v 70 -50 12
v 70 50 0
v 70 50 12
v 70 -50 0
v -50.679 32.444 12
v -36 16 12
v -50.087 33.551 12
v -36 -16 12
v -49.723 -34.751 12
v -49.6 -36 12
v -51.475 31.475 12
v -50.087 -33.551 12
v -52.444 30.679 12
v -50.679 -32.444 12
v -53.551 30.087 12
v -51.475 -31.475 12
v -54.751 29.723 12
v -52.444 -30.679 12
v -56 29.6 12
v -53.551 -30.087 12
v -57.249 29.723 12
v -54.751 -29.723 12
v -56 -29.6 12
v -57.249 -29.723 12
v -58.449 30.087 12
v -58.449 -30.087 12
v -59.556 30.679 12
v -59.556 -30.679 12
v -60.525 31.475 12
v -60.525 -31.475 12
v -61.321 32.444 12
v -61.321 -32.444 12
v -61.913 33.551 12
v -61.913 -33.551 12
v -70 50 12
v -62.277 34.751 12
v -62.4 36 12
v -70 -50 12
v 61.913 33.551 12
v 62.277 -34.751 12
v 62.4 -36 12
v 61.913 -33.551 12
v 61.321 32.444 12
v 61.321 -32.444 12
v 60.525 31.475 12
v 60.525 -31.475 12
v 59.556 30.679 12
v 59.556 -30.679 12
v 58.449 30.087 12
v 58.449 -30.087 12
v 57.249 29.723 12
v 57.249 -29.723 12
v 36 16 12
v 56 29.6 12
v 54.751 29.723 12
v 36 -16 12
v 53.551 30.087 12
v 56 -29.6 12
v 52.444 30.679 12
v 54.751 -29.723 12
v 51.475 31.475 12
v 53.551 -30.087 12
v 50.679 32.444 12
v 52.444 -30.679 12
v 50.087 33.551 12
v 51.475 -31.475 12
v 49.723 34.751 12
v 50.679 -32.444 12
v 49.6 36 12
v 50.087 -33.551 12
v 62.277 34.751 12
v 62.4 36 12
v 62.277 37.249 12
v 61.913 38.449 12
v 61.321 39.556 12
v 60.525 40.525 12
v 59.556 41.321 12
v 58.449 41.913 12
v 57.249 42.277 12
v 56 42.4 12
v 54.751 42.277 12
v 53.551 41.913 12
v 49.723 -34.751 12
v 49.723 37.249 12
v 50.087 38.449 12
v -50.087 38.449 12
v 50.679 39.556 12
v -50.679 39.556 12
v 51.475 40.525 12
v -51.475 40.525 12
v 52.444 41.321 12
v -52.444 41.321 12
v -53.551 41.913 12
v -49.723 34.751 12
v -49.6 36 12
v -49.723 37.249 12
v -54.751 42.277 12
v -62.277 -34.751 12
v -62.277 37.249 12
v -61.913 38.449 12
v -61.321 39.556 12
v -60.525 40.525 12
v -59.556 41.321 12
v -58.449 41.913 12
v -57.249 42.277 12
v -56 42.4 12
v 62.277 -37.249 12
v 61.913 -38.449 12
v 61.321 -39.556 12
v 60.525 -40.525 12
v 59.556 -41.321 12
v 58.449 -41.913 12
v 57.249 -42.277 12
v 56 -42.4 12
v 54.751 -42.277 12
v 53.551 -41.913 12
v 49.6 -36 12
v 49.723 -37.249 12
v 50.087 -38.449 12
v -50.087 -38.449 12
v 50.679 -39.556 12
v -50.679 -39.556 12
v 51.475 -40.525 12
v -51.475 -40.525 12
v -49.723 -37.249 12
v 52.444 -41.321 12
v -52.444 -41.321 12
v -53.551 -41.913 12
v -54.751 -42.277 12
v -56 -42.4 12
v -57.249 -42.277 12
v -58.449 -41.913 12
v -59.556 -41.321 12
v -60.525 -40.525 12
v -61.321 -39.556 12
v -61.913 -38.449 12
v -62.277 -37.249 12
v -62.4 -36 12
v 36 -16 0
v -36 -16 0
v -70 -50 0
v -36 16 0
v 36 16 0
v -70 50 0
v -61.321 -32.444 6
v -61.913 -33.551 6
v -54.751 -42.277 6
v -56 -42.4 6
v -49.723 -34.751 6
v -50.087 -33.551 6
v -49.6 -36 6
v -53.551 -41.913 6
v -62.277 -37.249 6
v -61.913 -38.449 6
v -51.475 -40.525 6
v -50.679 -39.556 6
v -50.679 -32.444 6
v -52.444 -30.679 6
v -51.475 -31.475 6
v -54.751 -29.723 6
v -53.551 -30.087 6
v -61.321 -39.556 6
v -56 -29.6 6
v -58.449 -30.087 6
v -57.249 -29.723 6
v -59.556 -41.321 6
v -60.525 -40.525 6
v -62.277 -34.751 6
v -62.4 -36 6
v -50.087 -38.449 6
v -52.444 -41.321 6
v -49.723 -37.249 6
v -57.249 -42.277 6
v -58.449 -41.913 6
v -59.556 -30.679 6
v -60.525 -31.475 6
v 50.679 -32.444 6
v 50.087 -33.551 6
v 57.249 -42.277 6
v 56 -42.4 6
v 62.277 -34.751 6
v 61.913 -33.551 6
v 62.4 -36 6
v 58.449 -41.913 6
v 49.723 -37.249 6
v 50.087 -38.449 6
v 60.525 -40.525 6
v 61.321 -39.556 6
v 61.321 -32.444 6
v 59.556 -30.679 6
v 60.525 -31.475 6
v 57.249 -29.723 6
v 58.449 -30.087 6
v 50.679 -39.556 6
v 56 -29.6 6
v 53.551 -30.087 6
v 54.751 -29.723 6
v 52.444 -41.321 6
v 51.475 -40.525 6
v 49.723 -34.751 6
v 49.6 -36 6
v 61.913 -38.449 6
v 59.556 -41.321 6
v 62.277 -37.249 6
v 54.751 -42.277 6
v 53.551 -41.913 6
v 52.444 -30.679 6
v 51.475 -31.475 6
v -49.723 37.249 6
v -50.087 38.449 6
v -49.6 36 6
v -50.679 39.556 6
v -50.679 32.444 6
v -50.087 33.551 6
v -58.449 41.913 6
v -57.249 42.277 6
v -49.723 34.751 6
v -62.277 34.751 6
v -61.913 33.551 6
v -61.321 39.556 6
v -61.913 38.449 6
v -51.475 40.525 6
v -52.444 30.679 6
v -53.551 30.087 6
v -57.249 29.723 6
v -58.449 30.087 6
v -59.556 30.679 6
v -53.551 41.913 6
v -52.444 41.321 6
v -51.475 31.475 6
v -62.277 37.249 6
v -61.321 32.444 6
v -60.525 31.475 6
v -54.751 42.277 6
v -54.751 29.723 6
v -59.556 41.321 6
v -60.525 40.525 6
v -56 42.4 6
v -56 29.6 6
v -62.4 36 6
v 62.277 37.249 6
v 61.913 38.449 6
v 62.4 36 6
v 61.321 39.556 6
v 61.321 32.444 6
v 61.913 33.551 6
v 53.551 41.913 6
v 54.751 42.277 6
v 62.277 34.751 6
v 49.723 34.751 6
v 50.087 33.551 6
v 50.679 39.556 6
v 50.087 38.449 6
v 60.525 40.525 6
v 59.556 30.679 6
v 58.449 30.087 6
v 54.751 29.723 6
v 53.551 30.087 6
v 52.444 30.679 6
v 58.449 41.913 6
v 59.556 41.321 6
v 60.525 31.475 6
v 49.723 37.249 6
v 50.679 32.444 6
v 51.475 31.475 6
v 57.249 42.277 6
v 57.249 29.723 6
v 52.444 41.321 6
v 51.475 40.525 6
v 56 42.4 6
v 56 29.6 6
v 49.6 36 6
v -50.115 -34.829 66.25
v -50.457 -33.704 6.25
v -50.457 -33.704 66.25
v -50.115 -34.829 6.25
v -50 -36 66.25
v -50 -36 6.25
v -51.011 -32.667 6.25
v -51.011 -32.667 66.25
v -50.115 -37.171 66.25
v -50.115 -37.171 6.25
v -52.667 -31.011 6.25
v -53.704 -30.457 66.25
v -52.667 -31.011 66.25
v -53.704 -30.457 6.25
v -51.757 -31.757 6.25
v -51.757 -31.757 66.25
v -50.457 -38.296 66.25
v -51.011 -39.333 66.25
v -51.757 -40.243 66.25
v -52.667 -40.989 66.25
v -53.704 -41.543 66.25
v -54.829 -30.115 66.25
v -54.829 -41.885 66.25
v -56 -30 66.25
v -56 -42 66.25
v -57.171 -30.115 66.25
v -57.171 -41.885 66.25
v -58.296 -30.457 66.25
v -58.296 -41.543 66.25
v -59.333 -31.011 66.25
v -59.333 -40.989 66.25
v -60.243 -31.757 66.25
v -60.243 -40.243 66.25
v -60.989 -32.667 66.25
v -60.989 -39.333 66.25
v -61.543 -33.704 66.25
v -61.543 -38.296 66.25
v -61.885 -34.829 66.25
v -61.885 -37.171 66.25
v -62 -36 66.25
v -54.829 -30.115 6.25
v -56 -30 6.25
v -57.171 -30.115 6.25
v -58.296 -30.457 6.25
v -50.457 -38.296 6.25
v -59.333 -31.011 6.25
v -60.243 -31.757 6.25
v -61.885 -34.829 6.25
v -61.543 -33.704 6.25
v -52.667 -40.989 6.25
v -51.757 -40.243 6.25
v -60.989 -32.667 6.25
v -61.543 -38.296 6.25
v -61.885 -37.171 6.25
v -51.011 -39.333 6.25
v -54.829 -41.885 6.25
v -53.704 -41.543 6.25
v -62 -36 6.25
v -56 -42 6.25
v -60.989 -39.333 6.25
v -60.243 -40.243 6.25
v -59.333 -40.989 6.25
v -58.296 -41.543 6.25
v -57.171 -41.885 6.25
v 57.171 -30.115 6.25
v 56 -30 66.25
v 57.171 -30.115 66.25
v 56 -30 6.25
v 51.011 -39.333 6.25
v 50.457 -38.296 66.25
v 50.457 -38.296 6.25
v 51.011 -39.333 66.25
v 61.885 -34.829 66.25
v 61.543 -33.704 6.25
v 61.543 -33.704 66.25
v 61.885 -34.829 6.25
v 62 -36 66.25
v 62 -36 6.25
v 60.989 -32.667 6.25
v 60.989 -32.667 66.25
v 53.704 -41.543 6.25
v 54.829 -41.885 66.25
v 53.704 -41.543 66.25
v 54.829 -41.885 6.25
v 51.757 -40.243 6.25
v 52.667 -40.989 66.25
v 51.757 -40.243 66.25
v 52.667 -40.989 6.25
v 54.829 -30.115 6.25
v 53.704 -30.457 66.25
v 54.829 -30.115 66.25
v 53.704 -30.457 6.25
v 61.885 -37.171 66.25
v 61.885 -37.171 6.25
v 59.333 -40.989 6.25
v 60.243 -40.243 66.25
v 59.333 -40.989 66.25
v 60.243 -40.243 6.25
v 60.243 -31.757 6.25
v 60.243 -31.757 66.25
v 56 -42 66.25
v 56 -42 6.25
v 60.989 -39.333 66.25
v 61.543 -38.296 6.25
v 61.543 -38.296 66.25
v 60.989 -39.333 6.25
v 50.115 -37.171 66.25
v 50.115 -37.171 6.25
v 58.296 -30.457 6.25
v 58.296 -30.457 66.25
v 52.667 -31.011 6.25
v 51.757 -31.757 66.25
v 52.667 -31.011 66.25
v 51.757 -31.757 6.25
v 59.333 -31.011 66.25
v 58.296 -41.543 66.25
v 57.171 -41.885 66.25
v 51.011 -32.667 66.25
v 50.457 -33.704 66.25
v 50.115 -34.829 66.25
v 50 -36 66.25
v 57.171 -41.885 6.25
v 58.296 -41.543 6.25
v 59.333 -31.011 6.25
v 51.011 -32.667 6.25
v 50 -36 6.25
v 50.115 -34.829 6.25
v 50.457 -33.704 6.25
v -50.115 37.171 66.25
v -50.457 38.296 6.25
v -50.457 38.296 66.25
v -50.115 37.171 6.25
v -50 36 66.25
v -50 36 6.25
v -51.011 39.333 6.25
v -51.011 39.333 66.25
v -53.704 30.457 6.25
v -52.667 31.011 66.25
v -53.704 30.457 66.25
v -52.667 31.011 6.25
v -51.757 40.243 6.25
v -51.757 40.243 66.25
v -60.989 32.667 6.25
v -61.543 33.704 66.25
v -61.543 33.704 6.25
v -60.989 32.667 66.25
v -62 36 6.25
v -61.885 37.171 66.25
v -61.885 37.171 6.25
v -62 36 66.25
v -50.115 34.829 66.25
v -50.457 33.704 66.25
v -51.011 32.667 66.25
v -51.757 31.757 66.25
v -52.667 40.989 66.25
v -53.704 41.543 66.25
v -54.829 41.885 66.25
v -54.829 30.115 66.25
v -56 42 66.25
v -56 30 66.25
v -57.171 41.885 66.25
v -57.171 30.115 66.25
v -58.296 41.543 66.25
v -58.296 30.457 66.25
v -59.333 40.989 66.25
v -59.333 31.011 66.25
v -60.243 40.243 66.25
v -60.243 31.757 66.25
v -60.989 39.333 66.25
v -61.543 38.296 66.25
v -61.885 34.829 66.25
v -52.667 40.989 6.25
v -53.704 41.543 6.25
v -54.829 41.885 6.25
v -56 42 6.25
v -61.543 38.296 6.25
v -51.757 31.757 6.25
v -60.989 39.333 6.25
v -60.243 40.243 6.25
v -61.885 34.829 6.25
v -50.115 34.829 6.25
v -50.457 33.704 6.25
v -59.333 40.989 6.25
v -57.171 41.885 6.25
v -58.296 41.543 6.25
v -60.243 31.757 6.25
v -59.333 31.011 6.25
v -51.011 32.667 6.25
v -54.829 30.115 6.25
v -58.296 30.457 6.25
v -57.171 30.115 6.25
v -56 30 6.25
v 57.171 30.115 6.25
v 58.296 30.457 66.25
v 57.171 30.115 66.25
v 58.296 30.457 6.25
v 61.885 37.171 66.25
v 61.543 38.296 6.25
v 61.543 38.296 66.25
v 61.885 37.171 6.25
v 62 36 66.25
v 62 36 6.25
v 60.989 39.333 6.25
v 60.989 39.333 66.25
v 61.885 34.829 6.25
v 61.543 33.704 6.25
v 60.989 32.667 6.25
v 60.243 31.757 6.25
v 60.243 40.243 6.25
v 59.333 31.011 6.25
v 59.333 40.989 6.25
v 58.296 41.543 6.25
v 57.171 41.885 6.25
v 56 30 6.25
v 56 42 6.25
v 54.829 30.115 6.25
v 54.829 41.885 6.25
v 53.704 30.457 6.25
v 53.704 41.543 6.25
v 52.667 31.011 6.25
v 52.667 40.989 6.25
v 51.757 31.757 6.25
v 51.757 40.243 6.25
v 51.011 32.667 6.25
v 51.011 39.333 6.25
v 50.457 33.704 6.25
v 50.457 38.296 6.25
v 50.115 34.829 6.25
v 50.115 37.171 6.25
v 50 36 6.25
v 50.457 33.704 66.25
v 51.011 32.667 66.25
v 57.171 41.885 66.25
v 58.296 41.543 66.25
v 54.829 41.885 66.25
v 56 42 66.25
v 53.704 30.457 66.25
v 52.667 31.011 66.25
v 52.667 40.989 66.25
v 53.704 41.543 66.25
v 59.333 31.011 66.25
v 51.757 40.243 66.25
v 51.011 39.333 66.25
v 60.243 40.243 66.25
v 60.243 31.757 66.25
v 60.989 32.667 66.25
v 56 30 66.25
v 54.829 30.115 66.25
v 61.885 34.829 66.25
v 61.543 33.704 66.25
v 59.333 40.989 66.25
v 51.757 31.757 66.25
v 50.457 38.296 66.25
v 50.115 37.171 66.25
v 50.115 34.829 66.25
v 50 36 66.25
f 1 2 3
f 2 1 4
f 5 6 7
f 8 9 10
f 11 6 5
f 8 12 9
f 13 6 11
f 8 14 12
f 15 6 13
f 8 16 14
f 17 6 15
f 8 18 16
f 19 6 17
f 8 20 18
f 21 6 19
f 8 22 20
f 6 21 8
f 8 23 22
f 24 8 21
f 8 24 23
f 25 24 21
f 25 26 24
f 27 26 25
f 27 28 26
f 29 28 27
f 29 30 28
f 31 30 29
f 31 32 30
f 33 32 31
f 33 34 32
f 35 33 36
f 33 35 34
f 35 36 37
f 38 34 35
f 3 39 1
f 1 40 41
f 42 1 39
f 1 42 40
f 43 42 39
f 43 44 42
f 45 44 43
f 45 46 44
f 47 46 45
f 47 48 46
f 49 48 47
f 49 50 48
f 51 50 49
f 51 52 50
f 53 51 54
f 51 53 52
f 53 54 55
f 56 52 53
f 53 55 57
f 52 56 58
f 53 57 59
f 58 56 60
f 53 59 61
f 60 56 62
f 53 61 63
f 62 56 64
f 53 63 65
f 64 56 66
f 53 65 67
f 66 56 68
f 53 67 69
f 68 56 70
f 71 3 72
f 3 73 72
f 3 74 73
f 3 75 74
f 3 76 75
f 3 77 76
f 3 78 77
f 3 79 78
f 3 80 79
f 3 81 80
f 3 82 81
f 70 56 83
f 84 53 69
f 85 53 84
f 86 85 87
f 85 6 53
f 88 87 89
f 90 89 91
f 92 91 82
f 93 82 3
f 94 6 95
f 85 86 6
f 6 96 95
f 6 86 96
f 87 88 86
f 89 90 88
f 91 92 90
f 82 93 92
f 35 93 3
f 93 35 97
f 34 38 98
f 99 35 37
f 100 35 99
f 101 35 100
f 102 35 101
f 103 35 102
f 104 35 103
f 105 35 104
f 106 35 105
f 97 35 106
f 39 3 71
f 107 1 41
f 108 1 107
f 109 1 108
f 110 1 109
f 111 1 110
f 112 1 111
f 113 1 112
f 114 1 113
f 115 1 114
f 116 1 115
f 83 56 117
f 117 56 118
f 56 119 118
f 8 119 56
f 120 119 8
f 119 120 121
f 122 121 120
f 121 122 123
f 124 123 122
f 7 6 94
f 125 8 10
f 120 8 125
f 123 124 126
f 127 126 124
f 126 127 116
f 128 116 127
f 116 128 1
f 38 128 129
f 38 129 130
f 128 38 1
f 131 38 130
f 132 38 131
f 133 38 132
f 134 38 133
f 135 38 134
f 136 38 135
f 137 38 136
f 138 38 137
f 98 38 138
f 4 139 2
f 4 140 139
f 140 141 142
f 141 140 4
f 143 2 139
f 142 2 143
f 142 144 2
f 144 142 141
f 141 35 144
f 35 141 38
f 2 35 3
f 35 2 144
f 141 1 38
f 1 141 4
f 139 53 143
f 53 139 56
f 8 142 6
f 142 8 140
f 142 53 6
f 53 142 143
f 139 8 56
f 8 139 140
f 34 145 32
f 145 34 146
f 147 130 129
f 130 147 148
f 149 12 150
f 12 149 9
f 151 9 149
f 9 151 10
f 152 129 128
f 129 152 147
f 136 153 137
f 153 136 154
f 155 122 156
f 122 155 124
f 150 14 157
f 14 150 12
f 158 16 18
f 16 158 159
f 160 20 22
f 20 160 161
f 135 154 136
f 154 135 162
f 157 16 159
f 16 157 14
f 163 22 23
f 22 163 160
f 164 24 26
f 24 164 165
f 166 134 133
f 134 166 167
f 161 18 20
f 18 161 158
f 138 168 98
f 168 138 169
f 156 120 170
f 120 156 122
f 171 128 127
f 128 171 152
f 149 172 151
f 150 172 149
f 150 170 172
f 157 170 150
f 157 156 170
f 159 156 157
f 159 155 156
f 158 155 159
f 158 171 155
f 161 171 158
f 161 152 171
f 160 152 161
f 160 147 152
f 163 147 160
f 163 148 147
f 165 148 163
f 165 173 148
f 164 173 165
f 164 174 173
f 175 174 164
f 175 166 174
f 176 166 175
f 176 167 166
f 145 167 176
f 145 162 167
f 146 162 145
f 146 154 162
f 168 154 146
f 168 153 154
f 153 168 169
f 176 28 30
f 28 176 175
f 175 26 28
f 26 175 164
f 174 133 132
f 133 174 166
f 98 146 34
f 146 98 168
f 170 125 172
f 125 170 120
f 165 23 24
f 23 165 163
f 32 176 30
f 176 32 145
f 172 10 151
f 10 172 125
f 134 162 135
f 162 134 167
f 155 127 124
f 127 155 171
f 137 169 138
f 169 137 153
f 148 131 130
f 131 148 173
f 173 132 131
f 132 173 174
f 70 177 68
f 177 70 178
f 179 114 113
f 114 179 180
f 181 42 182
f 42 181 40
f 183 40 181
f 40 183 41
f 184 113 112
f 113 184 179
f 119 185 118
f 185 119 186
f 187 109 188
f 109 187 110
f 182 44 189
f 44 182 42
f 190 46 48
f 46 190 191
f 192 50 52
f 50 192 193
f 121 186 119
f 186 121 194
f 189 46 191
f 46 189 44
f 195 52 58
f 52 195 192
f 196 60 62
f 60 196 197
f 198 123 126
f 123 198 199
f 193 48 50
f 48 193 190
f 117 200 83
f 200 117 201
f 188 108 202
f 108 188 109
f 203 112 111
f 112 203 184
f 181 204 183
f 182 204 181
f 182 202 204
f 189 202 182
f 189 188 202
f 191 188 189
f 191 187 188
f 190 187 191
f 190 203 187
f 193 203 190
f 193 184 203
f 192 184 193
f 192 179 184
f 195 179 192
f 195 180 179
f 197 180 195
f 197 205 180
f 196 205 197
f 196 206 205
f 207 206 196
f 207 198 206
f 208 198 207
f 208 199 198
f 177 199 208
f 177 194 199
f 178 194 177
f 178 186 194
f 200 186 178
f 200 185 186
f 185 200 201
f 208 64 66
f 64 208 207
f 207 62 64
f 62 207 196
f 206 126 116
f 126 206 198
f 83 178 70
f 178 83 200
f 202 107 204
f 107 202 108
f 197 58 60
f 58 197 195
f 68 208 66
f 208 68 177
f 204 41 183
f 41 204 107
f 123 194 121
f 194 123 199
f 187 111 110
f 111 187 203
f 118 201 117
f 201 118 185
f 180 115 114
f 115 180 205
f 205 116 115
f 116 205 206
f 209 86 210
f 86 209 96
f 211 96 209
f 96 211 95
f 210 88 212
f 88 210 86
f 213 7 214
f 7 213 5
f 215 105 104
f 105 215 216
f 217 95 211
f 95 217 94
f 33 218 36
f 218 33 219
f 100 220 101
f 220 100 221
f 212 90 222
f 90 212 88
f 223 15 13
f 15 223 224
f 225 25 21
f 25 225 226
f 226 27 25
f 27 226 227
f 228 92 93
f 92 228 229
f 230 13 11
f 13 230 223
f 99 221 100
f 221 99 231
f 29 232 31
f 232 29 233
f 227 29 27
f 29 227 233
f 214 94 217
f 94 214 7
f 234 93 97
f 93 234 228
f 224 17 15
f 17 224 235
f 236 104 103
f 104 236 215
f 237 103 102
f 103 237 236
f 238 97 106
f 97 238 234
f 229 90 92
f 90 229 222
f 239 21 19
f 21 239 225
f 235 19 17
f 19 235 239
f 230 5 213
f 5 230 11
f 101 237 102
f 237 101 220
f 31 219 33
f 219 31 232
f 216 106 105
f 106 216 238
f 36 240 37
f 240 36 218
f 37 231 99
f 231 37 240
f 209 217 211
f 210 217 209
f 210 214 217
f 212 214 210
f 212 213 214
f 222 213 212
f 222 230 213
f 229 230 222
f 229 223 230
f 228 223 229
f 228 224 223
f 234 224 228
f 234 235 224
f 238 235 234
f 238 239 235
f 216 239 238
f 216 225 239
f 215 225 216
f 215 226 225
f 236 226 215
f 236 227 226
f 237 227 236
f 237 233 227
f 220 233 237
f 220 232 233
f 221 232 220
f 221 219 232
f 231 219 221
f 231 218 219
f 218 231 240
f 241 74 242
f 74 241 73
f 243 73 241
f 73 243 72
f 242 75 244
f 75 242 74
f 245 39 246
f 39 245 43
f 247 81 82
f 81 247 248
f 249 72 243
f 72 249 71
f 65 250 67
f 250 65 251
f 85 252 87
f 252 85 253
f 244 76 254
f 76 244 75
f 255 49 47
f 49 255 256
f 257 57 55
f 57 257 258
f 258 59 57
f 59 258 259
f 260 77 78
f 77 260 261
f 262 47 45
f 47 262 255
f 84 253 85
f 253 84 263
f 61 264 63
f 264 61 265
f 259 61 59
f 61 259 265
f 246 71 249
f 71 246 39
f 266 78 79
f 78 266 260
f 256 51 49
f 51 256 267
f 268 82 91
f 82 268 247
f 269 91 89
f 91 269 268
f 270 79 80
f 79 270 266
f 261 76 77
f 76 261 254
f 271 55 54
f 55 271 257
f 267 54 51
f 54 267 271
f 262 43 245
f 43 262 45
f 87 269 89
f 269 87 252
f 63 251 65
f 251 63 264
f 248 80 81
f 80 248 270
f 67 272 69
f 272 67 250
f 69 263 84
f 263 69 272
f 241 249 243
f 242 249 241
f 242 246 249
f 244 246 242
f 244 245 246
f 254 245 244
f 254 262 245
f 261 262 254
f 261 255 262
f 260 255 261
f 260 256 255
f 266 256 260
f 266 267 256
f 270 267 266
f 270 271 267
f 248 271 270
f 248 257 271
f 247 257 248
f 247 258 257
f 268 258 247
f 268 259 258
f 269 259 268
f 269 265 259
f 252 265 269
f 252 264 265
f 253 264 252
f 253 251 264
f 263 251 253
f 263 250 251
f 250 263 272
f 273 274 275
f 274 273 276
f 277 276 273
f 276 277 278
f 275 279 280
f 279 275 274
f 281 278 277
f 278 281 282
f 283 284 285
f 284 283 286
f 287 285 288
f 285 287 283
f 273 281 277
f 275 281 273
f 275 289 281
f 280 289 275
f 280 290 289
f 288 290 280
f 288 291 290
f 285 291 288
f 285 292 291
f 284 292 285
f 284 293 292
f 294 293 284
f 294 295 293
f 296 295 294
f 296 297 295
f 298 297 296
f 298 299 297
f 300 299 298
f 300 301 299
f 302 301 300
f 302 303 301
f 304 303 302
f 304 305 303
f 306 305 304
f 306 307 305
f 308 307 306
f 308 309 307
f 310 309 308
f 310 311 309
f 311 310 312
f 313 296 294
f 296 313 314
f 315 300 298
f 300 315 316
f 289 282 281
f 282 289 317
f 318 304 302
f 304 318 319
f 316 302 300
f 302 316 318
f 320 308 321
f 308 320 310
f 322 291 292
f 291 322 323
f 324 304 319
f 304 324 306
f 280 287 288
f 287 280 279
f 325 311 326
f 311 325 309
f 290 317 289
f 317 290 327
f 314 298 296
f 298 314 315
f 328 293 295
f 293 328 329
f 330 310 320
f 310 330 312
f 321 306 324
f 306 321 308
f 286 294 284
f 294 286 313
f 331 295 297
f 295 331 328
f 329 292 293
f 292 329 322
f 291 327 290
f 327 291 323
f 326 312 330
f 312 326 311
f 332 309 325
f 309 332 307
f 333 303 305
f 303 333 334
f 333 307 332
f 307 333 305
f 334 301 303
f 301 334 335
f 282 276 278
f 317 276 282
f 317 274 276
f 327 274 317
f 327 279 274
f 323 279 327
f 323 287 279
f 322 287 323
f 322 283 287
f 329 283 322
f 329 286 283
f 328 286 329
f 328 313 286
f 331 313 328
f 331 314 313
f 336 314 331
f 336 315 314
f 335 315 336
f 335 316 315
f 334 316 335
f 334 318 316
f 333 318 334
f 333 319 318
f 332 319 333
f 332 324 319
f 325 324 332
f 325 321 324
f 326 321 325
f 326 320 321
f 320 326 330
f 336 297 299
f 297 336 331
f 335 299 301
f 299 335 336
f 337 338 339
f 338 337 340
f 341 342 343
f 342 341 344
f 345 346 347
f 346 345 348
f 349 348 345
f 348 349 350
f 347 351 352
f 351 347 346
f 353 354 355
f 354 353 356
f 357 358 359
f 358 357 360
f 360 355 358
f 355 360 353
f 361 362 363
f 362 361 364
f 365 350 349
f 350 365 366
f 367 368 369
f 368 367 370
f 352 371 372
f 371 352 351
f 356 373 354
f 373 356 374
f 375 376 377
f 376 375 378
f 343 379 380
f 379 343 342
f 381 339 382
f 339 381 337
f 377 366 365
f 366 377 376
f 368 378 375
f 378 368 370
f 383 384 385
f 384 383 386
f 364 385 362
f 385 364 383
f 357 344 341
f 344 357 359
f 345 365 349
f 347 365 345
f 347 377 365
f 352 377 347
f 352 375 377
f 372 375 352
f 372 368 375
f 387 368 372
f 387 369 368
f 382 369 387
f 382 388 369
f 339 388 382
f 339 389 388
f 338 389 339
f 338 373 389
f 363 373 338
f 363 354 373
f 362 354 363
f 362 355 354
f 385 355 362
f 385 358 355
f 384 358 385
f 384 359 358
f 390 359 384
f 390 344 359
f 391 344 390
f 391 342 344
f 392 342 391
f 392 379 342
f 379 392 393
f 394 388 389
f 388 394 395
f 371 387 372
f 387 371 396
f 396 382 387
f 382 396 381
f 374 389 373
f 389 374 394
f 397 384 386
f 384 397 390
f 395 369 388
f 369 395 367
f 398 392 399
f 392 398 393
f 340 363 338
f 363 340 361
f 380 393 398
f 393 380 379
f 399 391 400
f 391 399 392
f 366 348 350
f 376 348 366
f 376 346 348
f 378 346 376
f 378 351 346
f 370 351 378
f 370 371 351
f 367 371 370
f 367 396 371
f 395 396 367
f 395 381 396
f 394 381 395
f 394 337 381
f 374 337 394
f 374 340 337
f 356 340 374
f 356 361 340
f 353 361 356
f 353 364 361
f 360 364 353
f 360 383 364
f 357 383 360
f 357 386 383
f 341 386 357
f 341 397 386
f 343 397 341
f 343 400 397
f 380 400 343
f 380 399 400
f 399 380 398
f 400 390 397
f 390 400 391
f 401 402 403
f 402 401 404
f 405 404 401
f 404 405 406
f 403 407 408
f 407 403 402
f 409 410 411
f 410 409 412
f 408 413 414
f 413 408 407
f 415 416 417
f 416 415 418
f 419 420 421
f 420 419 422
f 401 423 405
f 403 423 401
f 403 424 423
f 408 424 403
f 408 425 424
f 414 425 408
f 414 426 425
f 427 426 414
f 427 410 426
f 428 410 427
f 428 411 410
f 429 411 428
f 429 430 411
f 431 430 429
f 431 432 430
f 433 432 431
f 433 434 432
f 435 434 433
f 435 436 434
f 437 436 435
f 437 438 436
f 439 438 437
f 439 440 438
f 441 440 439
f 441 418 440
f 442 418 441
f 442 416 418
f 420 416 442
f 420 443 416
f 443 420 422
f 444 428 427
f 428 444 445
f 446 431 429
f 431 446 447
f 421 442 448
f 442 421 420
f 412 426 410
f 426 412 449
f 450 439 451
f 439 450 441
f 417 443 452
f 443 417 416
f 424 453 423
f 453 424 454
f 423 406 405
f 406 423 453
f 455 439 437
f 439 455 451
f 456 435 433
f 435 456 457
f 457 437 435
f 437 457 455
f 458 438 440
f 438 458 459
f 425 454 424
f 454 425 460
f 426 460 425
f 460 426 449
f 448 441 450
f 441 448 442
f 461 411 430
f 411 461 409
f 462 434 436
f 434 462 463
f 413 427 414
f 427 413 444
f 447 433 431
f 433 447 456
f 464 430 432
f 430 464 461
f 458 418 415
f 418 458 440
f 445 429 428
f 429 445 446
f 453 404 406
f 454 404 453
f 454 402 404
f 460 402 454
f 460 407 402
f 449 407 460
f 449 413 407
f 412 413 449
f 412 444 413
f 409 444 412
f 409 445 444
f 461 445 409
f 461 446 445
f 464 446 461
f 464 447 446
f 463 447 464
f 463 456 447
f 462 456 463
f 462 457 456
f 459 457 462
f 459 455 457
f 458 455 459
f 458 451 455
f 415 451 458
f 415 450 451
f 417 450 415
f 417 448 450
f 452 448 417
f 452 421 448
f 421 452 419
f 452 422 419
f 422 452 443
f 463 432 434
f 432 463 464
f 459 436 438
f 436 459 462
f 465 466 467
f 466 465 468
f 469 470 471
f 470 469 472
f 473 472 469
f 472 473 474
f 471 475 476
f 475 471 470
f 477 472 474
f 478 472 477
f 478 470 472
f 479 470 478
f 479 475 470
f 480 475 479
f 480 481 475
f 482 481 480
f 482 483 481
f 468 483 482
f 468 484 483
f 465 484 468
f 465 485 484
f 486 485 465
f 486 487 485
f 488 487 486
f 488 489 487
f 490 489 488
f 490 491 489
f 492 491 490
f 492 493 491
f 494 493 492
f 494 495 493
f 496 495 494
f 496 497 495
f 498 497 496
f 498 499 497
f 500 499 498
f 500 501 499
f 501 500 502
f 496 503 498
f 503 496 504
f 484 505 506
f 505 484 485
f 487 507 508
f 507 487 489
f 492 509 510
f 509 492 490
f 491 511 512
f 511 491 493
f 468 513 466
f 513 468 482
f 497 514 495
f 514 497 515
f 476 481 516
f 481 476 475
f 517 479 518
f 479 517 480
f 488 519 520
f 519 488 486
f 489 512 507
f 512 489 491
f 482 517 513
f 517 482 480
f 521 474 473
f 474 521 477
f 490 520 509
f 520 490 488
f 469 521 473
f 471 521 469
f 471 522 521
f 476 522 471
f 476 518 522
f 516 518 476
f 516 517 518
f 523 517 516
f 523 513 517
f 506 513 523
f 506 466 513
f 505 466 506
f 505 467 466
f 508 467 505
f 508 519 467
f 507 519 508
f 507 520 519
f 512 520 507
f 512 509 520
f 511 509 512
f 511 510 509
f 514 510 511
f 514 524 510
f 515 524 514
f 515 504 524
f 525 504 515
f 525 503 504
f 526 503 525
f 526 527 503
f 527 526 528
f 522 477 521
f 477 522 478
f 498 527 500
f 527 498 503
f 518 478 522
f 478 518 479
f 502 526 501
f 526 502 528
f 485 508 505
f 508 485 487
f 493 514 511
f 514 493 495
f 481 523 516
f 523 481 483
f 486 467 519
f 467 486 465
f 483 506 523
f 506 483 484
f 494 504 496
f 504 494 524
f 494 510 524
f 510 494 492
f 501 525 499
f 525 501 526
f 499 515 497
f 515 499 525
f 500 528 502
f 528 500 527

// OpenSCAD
$fn = 32;

// ------------------------------------------------------------------------
// Frame with four posts: 140 x 100 mm frame, four d12 posts
// Every part is its own module, assembly() places them once.
// ------------------------------------------------------------------------

// --- part 1 ---
module base_frame() {
  difference() {
    translate([-70, -50, 0]) cube([140, 100, 12]);
    translate([-36, -16, -1]) cube([72, 32, 14]);
    translate([-56, -36, 6]) cylinder(h = 7, d = 12.8);
    translate([56, -36, 6]) cylinder(h = 7, d = 12.8);
    translate([-56, 36, 6]) cylinder(h = 7, d = 12.8);
    translate([56, 36, 6]) cylinder(h = 7, d = 12.8);
  }
}

// --- part 2 ---
module post1() {
  cylinder(h = 60, d = 12);
}

// --- part 3 ---
module post2() {
  cylinder(h = 60, d = 12);
}

// --- part 4 ---
module post3() {
  cylinder(h = 60, d = 12);
}

// --- part 5 ---
module post4() {
  cylinder(h = 60, d = 12);
}

// --- assembly ---
module assembly() {
  translate([0, 0, 0]) rotate([0, 0, 0]) base_frame();
  translate([-56, -36, 6.25]) rotate([0, 0, 0]) post1();
  translate([56, -36, 6.25]) rotate([0, 0, 0]) post2();
  translate([-56, 36, 6.25]) rotate([0, 0, 0]) post3();
  translate([56, 36, 6.25]) rotate([0, 0, 0]) post4();
}

assembly();
